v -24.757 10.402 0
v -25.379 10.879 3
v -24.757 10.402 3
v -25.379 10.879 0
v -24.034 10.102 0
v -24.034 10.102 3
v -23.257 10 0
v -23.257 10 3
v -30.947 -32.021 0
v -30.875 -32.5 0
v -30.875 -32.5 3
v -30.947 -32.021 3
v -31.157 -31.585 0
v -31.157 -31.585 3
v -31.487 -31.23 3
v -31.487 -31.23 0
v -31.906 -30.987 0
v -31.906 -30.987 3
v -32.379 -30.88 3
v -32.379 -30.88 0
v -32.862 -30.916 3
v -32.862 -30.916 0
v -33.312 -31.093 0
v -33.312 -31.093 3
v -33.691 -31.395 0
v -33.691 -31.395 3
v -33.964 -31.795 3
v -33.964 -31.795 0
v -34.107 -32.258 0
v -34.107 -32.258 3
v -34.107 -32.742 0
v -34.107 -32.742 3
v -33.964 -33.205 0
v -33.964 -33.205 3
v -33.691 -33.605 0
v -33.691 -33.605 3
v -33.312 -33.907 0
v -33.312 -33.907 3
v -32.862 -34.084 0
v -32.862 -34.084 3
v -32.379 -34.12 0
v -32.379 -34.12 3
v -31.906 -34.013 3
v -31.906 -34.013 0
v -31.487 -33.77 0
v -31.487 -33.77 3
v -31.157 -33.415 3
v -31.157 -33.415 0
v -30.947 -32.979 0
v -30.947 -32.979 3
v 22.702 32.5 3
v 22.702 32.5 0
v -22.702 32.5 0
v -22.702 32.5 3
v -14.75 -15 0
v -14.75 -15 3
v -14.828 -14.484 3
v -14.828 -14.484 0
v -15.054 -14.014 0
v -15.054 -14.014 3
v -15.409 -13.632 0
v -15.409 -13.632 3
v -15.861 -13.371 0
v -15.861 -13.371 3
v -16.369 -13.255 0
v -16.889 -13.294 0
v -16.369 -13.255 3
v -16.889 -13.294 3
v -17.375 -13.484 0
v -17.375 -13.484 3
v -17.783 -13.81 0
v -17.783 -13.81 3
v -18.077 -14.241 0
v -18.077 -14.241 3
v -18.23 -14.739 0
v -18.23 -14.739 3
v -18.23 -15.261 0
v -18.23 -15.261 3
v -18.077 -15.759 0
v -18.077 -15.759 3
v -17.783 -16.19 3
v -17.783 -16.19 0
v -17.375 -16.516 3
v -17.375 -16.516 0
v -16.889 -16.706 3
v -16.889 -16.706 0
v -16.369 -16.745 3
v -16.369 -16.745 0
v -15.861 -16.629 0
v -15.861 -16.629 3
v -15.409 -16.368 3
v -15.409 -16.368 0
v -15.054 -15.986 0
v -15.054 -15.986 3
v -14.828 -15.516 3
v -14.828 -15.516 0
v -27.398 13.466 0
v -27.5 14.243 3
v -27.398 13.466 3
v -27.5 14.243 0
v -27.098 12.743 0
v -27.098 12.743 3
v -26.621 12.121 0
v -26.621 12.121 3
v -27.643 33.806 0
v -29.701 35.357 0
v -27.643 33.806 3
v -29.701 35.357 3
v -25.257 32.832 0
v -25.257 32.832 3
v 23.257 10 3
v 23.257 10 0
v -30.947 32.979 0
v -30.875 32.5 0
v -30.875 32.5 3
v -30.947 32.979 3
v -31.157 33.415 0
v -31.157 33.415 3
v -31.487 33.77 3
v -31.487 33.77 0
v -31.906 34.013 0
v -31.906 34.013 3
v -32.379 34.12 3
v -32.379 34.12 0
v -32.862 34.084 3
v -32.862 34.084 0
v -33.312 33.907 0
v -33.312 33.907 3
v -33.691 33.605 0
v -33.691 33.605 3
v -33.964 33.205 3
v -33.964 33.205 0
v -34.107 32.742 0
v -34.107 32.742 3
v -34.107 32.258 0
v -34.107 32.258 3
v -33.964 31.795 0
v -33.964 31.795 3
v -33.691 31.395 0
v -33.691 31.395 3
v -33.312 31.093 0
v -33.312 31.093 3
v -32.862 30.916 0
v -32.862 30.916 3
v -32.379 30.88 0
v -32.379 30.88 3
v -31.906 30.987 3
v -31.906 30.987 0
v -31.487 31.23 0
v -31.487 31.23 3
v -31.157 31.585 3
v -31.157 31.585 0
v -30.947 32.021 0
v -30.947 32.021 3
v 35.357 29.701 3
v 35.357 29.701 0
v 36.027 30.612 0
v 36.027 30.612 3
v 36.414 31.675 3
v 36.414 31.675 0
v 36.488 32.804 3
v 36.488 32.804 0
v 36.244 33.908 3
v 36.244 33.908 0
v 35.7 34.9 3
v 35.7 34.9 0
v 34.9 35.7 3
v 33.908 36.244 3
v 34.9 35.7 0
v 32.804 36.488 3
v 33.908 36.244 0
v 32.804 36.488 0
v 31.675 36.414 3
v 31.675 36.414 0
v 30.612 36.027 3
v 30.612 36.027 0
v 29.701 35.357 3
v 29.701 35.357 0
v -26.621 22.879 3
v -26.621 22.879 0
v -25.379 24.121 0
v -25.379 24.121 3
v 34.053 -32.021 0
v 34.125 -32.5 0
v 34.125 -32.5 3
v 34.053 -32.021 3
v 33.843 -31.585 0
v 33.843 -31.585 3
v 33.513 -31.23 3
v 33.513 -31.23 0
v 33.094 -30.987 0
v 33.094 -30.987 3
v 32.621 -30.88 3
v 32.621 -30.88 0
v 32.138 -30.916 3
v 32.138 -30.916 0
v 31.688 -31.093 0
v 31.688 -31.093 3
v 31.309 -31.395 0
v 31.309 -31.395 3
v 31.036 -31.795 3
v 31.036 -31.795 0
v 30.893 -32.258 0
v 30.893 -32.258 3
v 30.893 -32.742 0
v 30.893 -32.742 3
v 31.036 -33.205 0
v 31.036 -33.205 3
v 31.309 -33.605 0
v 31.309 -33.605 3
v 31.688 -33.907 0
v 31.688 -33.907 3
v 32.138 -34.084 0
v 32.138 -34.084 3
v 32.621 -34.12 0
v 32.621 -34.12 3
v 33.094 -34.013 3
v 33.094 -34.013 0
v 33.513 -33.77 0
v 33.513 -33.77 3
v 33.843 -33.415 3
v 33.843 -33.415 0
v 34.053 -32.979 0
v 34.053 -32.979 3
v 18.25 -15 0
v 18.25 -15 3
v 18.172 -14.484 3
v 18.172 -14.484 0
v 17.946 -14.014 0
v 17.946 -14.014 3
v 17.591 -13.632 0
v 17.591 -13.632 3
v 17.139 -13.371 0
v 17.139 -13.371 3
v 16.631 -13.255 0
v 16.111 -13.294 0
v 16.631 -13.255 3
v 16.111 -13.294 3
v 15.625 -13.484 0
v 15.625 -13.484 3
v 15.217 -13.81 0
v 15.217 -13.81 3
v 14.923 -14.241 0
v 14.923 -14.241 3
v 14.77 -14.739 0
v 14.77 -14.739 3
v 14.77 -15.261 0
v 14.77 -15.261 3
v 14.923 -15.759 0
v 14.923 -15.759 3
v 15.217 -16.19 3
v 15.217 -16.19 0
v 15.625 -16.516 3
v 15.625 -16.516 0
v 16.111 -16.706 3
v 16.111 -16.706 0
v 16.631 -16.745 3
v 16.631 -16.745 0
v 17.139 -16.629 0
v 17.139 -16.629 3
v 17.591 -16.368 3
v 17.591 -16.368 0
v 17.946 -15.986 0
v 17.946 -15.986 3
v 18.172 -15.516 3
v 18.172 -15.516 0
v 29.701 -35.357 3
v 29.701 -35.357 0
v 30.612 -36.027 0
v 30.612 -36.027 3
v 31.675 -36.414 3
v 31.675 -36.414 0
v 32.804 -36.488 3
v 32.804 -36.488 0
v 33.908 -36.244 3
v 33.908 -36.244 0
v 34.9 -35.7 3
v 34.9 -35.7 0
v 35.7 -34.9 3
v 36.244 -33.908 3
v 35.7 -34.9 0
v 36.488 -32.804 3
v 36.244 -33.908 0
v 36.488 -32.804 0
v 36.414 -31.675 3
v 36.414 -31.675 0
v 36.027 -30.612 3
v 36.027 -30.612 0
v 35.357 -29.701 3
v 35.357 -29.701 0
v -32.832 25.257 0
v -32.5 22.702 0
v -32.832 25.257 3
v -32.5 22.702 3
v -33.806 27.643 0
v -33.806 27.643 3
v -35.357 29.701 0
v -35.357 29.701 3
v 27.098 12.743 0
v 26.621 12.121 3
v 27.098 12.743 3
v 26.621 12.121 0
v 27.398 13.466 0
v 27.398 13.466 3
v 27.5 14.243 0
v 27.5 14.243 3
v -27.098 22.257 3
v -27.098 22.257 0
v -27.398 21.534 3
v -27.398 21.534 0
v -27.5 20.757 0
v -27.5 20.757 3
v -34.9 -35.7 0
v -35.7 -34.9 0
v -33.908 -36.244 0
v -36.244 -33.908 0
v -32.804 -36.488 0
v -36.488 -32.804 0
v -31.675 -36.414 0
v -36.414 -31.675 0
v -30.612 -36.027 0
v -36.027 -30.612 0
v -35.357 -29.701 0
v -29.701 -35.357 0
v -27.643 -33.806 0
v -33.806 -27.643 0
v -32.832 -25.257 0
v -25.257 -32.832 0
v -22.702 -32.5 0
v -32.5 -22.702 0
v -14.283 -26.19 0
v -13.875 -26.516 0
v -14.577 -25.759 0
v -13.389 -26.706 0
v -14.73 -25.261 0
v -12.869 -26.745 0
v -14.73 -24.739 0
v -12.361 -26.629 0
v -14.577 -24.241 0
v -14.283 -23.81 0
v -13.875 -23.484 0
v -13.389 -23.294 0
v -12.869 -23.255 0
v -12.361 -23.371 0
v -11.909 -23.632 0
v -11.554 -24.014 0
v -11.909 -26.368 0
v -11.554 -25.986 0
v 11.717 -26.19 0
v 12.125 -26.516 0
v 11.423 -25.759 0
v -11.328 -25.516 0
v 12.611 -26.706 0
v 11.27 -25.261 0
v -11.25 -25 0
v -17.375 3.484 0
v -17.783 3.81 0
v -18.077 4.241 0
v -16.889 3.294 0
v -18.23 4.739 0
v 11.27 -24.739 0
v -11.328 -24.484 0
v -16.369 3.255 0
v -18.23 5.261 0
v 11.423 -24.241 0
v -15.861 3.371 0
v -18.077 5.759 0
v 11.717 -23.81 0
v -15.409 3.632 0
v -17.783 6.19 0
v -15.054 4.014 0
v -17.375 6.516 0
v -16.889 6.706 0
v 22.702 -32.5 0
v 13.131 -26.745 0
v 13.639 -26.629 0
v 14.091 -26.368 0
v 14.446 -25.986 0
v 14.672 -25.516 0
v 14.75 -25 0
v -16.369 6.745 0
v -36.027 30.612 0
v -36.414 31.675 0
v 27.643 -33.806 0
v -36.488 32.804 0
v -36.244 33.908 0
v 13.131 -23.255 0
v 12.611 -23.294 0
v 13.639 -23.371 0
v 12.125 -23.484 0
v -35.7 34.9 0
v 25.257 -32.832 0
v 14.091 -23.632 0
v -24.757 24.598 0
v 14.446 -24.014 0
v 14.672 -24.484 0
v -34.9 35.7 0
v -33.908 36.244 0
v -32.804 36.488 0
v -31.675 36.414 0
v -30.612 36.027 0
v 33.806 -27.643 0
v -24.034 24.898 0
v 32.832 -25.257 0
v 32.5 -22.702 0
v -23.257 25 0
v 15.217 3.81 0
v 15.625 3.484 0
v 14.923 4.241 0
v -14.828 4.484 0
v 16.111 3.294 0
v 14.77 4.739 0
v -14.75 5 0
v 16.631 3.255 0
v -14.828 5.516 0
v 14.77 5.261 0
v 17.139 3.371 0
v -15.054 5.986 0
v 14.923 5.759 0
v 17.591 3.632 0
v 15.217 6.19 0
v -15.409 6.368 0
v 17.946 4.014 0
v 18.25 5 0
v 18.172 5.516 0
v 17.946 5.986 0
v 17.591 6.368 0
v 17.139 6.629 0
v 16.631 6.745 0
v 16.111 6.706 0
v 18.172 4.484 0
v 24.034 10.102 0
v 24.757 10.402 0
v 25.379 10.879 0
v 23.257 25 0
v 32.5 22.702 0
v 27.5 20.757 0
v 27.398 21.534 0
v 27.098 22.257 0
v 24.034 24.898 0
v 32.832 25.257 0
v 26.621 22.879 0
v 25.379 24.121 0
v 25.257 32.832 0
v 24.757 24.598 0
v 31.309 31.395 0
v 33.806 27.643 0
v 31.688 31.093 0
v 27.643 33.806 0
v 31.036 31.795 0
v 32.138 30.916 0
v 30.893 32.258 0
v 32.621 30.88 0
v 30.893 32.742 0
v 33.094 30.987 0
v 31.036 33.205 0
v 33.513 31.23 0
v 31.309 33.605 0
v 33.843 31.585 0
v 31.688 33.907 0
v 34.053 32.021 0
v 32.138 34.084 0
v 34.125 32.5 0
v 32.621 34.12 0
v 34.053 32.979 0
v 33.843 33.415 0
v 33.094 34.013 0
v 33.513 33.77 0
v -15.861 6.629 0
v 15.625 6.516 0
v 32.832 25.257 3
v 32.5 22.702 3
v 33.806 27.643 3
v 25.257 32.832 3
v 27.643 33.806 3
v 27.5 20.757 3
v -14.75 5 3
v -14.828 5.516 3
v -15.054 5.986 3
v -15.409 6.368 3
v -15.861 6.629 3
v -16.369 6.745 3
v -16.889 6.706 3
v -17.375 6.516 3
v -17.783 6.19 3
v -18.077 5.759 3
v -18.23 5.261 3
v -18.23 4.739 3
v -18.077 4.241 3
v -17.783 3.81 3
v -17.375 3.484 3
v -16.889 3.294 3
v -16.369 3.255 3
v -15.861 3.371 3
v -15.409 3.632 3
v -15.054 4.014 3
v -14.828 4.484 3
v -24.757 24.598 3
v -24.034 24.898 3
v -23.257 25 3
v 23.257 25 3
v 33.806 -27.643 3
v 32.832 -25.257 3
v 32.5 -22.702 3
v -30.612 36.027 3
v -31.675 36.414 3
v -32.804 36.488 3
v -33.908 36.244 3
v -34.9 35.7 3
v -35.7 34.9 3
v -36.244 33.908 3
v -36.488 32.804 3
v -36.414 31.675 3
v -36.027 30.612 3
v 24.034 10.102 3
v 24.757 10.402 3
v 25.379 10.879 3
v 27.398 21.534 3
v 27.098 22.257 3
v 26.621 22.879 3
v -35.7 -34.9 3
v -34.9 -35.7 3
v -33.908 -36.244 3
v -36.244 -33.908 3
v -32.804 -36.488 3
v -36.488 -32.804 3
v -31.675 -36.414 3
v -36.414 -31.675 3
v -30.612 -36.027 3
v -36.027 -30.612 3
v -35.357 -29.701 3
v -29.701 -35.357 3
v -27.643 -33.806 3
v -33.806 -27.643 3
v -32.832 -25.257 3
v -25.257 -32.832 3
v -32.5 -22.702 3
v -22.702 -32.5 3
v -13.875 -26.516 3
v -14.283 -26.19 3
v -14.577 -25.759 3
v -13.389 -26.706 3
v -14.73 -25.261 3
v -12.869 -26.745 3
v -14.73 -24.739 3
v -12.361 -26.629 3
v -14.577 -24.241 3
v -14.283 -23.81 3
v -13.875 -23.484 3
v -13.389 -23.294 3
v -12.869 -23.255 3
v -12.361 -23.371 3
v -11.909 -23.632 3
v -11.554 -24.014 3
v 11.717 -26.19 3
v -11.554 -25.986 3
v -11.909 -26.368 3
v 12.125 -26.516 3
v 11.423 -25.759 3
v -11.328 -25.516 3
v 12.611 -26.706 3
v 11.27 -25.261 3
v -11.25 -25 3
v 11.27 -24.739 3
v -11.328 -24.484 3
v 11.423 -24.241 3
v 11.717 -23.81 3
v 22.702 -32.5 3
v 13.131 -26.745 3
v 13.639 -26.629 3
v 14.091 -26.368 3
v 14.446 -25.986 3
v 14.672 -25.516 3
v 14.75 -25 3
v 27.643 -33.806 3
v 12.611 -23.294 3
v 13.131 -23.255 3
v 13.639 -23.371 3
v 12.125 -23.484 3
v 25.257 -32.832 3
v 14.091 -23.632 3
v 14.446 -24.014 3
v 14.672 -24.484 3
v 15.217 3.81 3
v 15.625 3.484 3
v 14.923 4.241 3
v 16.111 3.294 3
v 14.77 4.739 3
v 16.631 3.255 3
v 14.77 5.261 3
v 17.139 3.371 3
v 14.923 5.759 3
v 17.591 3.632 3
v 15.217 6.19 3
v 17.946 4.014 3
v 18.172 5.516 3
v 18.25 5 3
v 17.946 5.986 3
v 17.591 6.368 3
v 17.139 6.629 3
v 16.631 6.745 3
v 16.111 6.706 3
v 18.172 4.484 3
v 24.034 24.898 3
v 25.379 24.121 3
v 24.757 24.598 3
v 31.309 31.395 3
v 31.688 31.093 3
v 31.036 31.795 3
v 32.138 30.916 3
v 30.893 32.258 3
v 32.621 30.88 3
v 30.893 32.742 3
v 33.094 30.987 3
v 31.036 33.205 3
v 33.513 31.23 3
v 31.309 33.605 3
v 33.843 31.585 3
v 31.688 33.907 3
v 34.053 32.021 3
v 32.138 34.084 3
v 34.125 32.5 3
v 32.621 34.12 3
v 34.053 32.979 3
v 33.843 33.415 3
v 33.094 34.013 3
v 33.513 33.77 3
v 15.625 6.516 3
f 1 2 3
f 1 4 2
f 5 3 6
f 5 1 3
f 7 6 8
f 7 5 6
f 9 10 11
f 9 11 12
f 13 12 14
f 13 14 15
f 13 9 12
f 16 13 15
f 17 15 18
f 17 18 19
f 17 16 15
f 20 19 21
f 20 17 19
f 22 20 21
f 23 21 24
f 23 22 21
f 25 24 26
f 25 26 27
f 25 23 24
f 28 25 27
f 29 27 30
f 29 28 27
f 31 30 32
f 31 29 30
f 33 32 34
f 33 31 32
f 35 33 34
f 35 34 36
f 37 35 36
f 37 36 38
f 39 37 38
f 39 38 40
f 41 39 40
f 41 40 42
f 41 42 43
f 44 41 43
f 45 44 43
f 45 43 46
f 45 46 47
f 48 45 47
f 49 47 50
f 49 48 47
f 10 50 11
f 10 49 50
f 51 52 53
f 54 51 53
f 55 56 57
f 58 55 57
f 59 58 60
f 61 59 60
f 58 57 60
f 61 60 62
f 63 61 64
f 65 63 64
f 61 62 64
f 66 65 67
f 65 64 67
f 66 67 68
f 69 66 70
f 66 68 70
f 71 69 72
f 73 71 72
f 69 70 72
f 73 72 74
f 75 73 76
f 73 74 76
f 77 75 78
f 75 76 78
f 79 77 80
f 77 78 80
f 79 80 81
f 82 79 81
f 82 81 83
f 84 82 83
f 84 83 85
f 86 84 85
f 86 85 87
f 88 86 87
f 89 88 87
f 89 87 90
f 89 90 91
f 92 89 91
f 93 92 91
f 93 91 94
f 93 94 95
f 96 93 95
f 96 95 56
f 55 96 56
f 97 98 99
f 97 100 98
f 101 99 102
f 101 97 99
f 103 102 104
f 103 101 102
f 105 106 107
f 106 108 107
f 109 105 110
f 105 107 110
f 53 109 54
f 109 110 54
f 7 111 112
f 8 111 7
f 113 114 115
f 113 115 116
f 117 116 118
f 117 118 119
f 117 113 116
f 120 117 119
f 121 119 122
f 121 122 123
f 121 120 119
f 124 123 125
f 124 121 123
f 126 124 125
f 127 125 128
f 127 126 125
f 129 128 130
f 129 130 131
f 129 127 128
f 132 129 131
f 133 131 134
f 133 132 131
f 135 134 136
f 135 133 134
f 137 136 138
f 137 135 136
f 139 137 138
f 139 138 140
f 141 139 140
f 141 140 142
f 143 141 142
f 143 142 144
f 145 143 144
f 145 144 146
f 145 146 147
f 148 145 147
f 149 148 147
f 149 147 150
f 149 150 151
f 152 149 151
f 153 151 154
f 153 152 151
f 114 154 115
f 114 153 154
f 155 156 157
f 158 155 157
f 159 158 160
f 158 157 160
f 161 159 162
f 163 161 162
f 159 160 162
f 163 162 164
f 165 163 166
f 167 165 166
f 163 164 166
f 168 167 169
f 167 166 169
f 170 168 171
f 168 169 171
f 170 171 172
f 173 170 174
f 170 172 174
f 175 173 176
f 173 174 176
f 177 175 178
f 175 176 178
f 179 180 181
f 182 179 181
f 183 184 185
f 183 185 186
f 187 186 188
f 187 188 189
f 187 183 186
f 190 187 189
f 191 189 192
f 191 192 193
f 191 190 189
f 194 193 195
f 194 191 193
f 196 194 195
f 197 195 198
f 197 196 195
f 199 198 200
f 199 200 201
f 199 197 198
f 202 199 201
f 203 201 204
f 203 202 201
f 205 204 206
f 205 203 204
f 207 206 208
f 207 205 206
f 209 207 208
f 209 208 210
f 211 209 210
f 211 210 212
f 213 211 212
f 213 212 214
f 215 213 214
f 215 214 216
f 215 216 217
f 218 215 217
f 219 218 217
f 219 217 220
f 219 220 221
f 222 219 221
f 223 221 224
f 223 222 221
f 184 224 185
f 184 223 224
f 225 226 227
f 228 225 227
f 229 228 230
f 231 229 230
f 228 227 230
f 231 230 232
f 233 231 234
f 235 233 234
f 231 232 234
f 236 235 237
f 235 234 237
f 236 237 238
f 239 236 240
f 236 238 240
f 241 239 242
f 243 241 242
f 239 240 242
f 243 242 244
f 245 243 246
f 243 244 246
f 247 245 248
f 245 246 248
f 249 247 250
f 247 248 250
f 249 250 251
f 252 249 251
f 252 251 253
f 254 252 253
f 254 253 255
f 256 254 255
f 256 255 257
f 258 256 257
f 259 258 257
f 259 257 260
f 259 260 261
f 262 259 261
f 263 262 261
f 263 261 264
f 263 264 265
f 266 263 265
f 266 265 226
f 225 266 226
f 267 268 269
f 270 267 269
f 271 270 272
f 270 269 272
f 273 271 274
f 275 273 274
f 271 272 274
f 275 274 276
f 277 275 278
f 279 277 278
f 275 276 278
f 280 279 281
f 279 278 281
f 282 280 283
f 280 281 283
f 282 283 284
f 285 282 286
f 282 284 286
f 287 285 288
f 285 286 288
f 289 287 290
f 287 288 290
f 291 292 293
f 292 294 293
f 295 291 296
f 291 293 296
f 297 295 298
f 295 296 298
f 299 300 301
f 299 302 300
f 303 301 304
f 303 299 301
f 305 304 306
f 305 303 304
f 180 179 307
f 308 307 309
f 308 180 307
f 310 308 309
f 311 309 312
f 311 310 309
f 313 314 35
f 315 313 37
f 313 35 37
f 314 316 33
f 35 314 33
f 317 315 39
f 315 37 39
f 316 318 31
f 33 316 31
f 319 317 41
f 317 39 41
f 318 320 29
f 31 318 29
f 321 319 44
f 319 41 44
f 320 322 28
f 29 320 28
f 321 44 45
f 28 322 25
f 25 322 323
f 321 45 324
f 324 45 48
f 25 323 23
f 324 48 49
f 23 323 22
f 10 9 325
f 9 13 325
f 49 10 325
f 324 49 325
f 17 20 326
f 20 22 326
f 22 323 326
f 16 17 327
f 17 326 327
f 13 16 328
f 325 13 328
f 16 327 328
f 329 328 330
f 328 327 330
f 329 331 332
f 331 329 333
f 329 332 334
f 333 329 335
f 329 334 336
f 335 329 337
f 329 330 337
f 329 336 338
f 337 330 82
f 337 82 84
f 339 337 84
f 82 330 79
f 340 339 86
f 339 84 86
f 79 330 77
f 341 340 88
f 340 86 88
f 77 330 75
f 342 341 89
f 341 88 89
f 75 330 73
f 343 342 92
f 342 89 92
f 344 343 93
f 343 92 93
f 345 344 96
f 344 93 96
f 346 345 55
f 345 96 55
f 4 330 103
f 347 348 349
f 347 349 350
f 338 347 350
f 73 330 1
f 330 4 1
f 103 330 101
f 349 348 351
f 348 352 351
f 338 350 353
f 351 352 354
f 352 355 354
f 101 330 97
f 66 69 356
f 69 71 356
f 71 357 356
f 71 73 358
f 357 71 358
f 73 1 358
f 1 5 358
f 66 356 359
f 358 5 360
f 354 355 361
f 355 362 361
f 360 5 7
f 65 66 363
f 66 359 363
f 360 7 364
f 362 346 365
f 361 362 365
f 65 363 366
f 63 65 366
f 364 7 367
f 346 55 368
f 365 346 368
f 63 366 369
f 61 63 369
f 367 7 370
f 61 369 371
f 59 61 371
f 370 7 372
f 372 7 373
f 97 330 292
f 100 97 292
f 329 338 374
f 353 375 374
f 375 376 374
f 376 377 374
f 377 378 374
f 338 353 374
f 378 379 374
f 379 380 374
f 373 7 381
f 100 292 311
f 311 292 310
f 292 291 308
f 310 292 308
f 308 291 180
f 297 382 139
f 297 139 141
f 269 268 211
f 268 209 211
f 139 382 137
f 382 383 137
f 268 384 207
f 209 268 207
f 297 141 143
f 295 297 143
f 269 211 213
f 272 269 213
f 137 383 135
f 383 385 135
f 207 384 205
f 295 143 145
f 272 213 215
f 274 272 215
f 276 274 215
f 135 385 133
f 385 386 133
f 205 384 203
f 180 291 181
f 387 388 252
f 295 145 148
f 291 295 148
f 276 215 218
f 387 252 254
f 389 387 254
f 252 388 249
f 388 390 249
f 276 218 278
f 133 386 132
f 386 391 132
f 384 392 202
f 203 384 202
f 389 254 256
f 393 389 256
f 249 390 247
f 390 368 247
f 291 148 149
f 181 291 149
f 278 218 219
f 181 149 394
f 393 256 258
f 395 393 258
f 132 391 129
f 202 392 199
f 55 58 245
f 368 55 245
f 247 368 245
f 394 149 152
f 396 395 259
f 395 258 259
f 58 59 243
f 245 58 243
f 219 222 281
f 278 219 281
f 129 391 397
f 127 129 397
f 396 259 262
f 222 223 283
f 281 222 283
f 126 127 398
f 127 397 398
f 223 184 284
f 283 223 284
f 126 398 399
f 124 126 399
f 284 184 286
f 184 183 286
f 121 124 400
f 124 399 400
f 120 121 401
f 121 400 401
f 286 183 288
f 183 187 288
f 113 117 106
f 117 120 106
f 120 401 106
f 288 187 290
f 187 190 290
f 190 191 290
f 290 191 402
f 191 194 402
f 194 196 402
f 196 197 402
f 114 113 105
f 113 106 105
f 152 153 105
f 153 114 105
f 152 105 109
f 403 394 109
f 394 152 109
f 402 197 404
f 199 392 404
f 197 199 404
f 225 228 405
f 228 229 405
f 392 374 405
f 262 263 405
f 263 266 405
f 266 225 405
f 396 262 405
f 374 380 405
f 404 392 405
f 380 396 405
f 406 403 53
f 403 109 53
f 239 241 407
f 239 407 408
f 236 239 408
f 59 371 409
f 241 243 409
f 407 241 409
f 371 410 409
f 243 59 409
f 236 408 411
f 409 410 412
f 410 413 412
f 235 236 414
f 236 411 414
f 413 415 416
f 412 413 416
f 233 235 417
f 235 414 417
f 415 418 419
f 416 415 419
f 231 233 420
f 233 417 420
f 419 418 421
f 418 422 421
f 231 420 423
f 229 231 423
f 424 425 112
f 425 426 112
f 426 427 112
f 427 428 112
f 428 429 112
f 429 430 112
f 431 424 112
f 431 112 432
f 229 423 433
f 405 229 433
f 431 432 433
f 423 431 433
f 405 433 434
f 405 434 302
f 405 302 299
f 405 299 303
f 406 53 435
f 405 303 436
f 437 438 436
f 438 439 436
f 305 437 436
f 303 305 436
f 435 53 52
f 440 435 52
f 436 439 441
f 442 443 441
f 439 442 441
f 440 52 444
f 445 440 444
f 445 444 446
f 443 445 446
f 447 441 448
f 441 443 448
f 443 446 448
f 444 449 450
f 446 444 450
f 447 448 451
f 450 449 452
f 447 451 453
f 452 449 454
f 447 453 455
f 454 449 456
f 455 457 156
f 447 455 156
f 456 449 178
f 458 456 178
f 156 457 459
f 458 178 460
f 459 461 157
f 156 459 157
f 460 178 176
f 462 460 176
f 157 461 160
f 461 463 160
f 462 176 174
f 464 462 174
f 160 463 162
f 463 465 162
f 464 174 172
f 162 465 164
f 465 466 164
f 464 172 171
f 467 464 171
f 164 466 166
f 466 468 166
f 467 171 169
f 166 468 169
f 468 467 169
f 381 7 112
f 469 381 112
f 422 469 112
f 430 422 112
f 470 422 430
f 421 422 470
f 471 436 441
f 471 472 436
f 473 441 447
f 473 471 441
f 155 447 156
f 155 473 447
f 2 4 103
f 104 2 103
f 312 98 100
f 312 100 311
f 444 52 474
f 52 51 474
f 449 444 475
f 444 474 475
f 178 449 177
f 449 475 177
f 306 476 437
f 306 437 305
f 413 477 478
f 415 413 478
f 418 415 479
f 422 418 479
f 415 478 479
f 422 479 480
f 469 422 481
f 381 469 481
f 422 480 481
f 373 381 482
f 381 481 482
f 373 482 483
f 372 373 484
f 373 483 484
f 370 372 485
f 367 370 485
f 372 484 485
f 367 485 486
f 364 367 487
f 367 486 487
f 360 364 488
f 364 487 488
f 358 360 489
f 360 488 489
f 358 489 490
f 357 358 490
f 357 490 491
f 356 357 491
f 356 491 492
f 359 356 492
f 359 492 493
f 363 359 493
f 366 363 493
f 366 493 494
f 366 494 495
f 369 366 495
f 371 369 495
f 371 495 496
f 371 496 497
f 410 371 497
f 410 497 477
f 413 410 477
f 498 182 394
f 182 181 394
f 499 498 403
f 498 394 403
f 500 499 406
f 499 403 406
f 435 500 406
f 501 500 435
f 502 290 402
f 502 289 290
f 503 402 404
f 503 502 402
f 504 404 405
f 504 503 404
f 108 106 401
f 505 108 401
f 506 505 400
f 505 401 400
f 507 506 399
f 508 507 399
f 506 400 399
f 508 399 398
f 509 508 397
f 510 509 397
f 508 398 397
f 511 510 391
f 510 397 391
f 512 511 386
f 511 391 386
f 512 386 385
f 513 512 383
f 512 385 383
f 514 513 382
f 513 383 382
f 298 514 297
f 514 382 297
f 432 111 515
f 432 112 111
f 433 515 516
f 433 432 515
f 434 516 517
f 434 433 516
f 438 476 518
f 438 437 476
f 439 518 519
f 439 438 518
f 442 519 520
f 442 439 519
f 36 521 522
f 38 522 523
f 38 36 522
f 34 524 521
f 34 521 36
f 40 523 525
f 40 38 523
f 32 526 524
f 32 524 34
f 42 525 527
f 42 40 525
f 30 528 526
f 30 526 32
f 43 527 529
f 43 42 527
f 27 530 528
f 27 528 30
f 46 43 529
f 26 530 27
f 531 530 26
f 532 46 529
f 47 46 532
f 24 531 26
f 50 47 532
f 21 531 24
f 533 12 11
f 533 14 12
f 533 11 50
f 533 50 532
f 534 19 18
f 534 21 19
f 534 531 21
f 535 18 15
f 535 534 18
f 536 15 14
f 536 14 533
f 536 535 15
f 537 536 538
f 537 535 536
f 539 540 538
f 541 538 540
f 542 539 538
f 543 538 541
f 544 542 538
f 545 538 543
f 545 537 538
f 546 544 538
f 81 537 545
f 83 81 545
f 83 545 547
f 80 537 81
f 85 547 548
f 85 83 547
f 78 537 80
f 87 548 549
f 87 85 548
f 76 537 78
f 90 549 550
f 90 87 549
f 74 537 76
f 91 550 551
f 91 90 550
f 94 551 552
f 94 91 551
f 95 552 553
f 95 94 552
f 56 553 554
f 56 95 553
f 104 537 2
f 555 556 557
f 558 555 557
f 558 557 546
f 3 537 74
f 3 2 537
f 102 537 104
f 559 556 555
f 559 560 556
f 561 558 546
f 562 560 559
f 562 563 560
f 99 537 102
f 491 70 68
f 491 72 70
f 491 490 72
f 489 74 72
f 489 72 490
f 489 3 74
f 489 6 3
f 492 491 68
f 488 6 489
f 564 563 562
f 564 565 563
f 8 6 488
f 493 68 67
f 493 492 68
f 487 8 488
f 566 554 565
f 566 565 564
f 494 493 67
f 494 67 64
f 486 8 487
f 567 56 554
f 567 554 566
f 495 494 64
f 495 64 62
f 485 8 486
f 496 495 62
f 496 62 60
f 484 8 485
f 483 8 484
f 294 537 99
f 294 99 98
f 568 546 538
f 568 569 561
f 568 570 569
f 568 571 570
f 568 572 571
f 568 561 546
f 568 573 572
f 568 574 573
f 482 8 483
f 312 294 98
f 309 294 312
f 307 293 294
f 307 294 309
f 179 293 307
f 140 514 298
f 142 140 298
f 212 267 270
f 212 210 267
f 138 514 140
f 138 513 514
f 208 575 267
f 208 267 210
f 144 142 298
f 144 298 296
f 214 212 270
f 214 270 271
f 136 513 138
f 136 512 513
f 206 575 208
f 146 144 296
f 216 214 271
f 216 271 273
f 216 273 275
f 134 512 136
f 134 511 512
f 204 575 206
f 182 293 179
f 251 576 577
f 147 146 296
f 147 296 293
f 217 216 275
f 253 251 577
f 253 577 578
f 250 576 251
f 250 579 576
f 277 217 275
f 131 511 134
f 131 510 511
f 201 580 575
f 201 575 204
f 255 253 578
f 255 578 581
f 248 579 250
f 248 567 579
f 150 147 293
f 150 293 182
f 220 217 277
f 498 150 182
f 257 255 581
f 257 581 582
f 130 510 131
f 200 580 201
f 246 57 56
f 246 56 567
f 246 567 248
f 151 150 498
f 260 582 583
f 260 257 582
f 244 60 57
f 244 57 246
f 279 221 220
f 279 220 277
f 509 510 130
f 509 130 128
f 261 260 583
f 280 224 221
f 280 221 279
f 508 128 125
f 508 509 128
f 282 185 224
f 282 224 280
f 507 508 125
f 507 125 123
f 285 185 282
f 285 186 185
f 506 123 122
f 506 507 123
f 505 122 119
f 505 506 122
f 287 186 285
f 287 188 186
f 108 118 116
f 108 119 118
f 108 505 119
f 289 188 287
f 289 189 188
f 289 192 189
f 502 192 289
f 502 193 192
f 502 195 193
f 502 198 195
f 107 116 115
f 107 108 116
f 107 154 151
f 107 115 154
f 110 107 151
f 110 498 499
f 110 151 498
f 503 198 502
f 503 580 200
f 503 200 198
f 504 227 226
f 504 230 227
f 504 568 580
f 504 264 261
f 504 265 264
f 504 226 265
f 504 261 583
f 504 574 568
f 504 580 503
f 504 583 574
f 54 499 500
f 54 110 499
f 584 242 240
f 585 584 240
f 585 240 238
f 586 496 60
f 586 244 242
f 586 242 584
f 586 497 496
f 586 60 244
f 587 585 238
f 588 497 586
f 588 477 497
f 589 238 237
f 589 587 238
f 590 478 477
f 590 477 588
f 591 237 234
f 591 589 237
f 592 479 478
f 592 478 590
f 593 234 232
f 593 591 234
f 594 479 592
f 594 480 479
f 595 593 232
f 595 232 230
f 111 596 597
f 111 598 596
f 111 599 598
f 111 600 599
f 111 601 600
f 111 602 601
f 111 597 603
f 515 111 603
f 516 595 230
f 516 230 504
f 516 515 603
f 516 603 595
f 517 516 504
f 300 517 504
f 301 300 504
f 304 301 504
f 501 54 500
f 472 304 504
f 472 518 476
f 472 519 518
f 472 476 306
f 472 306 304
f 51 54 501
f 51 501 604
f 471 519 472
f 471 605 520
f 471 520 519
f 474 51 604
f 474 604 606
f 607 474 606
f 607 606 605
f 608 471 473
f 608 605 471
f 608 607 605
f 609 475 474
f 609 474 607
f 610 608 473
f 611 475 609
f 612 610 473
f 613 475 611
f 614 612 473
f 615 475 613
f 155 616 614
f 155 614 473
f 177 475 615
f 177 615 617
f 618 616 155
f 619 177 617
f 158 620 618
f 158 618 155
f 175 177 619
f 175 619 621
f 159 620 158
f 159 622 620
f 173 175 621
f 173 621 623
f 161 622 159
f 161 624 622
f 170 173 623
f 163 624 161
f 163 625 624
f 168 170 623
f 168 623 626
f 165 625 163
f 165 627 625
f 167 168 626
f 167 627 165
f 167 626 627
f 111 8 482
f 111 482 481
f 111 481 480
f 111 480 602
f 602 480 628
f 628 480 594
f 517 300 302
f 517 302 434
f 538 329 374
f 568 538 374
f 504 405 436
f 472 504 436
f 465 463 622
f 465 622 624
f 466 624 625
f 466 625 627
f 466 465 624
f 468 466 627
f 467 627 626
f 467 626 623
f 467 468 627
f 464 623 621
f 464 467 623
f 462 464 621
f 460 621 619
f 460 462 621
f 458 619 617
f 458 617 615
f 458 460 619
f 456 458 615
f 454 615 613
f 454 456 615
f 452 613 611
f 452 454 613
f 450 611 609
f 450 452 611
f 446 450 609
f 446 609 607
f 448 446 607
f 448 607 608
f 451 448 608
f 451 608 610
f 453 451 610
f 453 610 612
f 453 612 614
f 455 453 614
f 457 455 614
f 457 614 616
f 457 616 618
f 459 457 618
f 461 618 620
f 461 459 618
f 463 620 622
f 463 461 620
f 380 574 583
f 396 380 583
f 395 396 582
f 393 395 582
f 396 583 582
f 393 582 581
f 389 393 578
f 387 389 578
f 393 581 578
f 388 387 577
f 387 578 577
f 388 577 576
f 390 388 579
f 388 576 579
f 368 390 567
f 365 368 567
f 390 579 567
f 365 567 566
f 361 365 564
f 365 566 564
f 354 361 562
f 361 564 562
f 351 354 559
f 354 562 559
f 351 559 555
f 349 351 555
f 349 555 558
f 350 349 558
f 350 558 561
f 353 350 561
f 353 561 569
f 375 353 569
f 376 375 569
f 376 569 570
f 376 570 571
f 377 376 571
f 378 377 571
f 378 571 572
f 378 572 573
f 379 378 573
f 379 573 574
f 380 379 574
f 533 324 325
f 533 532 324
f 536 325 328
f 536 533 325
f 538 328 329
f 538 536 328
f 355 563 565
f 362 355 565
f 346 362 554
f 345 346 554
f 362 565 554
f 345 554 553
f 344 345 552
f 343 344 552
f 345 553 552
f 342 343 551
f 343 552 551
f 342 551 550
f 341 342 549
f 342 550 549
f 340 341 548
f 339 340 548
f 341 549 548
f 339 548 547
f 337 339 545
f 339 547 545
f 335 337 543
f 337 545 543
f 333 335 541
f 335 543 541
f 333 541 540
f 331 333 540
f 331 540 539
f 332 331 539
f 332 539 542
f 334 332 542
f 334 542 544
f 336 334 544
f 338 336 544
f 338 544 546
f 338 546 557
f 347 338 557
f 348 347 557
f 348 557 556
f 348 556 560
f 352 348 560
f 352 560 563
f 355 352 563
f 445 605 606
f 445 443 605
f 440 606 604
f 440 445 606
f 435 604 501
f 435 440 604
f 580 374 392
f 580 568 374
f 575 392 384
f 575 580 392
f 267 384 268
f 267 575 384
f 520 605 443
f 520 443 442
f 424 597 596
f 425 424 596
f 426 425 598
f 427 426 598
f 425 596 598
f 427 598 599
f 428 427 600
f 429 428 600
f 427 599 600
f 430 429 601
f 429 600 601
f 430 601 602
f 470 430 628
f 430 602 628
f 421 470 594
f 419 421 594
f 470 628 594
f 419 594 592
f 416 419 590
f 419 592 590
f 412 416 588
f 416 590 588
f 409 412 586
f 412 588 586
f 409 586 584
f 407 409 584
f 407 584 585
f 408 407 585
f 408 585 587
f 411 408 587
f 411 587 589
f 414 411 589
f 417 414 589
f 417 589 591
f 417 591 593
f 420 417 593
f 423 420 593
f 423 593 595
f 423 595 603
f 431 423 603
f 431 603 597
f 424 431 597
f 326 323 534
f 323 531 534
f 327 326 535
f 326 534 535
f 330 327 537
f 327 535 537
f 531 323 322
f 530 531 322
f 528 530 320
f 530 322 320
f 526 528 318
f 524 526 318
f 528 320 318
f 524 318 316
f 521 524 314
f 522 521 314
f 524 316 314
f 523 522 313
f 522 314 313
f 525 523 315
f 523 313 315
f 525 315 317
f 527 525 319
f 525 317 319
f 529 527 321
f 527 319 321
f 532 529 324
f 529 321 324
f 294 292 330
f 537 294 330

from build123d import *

# Parameters (mm, degrees)
SKETCH_1_R          = 1.625
EXTRUDE_1_DEPTH     = 3
FILLET_1_R          = 10
SKETCH_2_R          = 1.75
CUT_EXTRUDE_1_DEPTH = 10
SKETCH_4_R          = 1.75
CUT_EXTRUDE_2_DEPTH = 10
SKETCH_5_R          = 1.75
CUT_EXTRUDE_3_DEPTH = 10
CUT_EXTRUDE_4_DEPTH = 10
FILLET_2_R          = 3


with BuildPart() as part:
    # Эскиз1 → Бобышка-Вытянуть1 (new body)
    with BuildSketch(Plane.XY):
        with BuildLine():
            ThreePointArc((-32.5, -28.5), (-35.328427125, -35.328427125), (-28.5, -32.5))
            Line((-28.5, -32.5), (28.5, -32.5))
            ThreePointArc((28.5, -32.5), (35.328427125, -35.328427125), (32.5, -28.5))
            Line((32.5, -28.5), (32.5, 28.5))
            ThreePointArc((32.5, 28.5), (35.328427125, 35.328427125), (28.5, 32.5))
            Line((28.5, 32.5), (-28.5, 32.5))
            ThreePointArc((-28.5, 32.5), (-35.328427125, 35.328427125), (-32.5, 28.5))
            Line((-32.5, 28.5), (-32.5, -28.5))
        make_face()
        with Locations((-32.5, -32.5)):
            Circle(SKETCH_1_R, mode=Mode.SUBTRACT)
        with Locations((32.5, 32.5)):
            Circle(SKETCH_1_R, mode=Mode.SUBTRACT)
        with Locations((-32.5, 32.5)):
            Circle(SKETCH_1_R, mode=Mode.SUBTRACT)
        with Locations((32.5, -32.5)):
            Circle(SKETCH_1_R, mode=Mode.SUBTRACT)
    extrude(amount=EXTRUDE_1_DEPTH)

    # Скругление1
    fillet_1_edges = [part.edges().sort_by_distance(p)[0] for p in [
        (-32.5, -28.5, 1.5),
        (-32.5, 28.5, 1.5),
        (-28.5, 32.5, 1.5),
        (28.5, 32.5, 1.5),
        (32.5, 28.5, 1.5),
        (32.5, -28.5, 1.5),
        (28.5, -32.5, 1.5),
        (-28.5, -32.5, 1.5),
    ]]
    fillet(fillet_1_edges, radius=FILLET_1_R)

    # Эскиз2 → Вырез-Вытянуть1 (cut)
    with BuildSketch(Plane.XY.offset(3)):
        with Locations((-13, -25)):
            Circle(SKETCH_2_R)
        with Locations((13, -25)):
            Circle(SKETCH_2_R)
    extrude(amount=-CUT_EXTRUDE_1_DEPTH, mode=Mode.SUBTRACT)

    # Эскиз4 → Вырез-Вытянуть2 (cut)
    with BuildSketch(Plane.XY.offset(3)):
        with Locations((-16.5, -15)):
            Circle(SKETCH_4_R)
        with Locations((16.5, -15)):
            Circle(SKETCH_4_R)
    extrude(amount=-CUT_EXTRUDE_2_DEPTH, mode=Mode.SUBTRACT)

    # Эскиз5 → Вырез-Вытянуть3 (cut)
    with BuildSketch(Plane.XY.offset(3)):
        with Locations((-16.5, 5)):
            Circle(SKETCH_5_R)
        with Locations((16.5, 5)):
            Circle(SKETCH_5_R)
    extrude(amount=-CUT_EXTRUDE_3_DEPTH, mode=Mode.SUBTRACT)

    # Эскиз7 → Вырез-Вытянуть4 (cut)
    with BuildSketch(Plane.XY.offset(3)):
        Polygon((-24.5, 25), (24.5, 25), (27.5, 22), (27.5, 13), (24.5, 10), (-24.5, 10), (-27.5, 13), (-27.5, 22), align=None)
    extrude(amount=-CUT_EXTRUDE_4_DEPTH, mode=Mode.SUBTRACT)

    # Скругление2
    fillet_2_edges = [part.edges().sort_by_distance(p)[0] for p in [
        (-27.5, 22, 1.5),
        (-24.5, 25, 1.5),
        (24.5, 25, 1.5),
        (27.5, 22, 1.5),
        (27.5, 13, 1.5),
        (24.5, 10, 1.5),
        (-24.5, 10, 1.5),
        (-27.5, 13, 1.5),
    ]]
    fillet(fillet_2_edges, radius=FILLET_2_R)


solid = part.part
